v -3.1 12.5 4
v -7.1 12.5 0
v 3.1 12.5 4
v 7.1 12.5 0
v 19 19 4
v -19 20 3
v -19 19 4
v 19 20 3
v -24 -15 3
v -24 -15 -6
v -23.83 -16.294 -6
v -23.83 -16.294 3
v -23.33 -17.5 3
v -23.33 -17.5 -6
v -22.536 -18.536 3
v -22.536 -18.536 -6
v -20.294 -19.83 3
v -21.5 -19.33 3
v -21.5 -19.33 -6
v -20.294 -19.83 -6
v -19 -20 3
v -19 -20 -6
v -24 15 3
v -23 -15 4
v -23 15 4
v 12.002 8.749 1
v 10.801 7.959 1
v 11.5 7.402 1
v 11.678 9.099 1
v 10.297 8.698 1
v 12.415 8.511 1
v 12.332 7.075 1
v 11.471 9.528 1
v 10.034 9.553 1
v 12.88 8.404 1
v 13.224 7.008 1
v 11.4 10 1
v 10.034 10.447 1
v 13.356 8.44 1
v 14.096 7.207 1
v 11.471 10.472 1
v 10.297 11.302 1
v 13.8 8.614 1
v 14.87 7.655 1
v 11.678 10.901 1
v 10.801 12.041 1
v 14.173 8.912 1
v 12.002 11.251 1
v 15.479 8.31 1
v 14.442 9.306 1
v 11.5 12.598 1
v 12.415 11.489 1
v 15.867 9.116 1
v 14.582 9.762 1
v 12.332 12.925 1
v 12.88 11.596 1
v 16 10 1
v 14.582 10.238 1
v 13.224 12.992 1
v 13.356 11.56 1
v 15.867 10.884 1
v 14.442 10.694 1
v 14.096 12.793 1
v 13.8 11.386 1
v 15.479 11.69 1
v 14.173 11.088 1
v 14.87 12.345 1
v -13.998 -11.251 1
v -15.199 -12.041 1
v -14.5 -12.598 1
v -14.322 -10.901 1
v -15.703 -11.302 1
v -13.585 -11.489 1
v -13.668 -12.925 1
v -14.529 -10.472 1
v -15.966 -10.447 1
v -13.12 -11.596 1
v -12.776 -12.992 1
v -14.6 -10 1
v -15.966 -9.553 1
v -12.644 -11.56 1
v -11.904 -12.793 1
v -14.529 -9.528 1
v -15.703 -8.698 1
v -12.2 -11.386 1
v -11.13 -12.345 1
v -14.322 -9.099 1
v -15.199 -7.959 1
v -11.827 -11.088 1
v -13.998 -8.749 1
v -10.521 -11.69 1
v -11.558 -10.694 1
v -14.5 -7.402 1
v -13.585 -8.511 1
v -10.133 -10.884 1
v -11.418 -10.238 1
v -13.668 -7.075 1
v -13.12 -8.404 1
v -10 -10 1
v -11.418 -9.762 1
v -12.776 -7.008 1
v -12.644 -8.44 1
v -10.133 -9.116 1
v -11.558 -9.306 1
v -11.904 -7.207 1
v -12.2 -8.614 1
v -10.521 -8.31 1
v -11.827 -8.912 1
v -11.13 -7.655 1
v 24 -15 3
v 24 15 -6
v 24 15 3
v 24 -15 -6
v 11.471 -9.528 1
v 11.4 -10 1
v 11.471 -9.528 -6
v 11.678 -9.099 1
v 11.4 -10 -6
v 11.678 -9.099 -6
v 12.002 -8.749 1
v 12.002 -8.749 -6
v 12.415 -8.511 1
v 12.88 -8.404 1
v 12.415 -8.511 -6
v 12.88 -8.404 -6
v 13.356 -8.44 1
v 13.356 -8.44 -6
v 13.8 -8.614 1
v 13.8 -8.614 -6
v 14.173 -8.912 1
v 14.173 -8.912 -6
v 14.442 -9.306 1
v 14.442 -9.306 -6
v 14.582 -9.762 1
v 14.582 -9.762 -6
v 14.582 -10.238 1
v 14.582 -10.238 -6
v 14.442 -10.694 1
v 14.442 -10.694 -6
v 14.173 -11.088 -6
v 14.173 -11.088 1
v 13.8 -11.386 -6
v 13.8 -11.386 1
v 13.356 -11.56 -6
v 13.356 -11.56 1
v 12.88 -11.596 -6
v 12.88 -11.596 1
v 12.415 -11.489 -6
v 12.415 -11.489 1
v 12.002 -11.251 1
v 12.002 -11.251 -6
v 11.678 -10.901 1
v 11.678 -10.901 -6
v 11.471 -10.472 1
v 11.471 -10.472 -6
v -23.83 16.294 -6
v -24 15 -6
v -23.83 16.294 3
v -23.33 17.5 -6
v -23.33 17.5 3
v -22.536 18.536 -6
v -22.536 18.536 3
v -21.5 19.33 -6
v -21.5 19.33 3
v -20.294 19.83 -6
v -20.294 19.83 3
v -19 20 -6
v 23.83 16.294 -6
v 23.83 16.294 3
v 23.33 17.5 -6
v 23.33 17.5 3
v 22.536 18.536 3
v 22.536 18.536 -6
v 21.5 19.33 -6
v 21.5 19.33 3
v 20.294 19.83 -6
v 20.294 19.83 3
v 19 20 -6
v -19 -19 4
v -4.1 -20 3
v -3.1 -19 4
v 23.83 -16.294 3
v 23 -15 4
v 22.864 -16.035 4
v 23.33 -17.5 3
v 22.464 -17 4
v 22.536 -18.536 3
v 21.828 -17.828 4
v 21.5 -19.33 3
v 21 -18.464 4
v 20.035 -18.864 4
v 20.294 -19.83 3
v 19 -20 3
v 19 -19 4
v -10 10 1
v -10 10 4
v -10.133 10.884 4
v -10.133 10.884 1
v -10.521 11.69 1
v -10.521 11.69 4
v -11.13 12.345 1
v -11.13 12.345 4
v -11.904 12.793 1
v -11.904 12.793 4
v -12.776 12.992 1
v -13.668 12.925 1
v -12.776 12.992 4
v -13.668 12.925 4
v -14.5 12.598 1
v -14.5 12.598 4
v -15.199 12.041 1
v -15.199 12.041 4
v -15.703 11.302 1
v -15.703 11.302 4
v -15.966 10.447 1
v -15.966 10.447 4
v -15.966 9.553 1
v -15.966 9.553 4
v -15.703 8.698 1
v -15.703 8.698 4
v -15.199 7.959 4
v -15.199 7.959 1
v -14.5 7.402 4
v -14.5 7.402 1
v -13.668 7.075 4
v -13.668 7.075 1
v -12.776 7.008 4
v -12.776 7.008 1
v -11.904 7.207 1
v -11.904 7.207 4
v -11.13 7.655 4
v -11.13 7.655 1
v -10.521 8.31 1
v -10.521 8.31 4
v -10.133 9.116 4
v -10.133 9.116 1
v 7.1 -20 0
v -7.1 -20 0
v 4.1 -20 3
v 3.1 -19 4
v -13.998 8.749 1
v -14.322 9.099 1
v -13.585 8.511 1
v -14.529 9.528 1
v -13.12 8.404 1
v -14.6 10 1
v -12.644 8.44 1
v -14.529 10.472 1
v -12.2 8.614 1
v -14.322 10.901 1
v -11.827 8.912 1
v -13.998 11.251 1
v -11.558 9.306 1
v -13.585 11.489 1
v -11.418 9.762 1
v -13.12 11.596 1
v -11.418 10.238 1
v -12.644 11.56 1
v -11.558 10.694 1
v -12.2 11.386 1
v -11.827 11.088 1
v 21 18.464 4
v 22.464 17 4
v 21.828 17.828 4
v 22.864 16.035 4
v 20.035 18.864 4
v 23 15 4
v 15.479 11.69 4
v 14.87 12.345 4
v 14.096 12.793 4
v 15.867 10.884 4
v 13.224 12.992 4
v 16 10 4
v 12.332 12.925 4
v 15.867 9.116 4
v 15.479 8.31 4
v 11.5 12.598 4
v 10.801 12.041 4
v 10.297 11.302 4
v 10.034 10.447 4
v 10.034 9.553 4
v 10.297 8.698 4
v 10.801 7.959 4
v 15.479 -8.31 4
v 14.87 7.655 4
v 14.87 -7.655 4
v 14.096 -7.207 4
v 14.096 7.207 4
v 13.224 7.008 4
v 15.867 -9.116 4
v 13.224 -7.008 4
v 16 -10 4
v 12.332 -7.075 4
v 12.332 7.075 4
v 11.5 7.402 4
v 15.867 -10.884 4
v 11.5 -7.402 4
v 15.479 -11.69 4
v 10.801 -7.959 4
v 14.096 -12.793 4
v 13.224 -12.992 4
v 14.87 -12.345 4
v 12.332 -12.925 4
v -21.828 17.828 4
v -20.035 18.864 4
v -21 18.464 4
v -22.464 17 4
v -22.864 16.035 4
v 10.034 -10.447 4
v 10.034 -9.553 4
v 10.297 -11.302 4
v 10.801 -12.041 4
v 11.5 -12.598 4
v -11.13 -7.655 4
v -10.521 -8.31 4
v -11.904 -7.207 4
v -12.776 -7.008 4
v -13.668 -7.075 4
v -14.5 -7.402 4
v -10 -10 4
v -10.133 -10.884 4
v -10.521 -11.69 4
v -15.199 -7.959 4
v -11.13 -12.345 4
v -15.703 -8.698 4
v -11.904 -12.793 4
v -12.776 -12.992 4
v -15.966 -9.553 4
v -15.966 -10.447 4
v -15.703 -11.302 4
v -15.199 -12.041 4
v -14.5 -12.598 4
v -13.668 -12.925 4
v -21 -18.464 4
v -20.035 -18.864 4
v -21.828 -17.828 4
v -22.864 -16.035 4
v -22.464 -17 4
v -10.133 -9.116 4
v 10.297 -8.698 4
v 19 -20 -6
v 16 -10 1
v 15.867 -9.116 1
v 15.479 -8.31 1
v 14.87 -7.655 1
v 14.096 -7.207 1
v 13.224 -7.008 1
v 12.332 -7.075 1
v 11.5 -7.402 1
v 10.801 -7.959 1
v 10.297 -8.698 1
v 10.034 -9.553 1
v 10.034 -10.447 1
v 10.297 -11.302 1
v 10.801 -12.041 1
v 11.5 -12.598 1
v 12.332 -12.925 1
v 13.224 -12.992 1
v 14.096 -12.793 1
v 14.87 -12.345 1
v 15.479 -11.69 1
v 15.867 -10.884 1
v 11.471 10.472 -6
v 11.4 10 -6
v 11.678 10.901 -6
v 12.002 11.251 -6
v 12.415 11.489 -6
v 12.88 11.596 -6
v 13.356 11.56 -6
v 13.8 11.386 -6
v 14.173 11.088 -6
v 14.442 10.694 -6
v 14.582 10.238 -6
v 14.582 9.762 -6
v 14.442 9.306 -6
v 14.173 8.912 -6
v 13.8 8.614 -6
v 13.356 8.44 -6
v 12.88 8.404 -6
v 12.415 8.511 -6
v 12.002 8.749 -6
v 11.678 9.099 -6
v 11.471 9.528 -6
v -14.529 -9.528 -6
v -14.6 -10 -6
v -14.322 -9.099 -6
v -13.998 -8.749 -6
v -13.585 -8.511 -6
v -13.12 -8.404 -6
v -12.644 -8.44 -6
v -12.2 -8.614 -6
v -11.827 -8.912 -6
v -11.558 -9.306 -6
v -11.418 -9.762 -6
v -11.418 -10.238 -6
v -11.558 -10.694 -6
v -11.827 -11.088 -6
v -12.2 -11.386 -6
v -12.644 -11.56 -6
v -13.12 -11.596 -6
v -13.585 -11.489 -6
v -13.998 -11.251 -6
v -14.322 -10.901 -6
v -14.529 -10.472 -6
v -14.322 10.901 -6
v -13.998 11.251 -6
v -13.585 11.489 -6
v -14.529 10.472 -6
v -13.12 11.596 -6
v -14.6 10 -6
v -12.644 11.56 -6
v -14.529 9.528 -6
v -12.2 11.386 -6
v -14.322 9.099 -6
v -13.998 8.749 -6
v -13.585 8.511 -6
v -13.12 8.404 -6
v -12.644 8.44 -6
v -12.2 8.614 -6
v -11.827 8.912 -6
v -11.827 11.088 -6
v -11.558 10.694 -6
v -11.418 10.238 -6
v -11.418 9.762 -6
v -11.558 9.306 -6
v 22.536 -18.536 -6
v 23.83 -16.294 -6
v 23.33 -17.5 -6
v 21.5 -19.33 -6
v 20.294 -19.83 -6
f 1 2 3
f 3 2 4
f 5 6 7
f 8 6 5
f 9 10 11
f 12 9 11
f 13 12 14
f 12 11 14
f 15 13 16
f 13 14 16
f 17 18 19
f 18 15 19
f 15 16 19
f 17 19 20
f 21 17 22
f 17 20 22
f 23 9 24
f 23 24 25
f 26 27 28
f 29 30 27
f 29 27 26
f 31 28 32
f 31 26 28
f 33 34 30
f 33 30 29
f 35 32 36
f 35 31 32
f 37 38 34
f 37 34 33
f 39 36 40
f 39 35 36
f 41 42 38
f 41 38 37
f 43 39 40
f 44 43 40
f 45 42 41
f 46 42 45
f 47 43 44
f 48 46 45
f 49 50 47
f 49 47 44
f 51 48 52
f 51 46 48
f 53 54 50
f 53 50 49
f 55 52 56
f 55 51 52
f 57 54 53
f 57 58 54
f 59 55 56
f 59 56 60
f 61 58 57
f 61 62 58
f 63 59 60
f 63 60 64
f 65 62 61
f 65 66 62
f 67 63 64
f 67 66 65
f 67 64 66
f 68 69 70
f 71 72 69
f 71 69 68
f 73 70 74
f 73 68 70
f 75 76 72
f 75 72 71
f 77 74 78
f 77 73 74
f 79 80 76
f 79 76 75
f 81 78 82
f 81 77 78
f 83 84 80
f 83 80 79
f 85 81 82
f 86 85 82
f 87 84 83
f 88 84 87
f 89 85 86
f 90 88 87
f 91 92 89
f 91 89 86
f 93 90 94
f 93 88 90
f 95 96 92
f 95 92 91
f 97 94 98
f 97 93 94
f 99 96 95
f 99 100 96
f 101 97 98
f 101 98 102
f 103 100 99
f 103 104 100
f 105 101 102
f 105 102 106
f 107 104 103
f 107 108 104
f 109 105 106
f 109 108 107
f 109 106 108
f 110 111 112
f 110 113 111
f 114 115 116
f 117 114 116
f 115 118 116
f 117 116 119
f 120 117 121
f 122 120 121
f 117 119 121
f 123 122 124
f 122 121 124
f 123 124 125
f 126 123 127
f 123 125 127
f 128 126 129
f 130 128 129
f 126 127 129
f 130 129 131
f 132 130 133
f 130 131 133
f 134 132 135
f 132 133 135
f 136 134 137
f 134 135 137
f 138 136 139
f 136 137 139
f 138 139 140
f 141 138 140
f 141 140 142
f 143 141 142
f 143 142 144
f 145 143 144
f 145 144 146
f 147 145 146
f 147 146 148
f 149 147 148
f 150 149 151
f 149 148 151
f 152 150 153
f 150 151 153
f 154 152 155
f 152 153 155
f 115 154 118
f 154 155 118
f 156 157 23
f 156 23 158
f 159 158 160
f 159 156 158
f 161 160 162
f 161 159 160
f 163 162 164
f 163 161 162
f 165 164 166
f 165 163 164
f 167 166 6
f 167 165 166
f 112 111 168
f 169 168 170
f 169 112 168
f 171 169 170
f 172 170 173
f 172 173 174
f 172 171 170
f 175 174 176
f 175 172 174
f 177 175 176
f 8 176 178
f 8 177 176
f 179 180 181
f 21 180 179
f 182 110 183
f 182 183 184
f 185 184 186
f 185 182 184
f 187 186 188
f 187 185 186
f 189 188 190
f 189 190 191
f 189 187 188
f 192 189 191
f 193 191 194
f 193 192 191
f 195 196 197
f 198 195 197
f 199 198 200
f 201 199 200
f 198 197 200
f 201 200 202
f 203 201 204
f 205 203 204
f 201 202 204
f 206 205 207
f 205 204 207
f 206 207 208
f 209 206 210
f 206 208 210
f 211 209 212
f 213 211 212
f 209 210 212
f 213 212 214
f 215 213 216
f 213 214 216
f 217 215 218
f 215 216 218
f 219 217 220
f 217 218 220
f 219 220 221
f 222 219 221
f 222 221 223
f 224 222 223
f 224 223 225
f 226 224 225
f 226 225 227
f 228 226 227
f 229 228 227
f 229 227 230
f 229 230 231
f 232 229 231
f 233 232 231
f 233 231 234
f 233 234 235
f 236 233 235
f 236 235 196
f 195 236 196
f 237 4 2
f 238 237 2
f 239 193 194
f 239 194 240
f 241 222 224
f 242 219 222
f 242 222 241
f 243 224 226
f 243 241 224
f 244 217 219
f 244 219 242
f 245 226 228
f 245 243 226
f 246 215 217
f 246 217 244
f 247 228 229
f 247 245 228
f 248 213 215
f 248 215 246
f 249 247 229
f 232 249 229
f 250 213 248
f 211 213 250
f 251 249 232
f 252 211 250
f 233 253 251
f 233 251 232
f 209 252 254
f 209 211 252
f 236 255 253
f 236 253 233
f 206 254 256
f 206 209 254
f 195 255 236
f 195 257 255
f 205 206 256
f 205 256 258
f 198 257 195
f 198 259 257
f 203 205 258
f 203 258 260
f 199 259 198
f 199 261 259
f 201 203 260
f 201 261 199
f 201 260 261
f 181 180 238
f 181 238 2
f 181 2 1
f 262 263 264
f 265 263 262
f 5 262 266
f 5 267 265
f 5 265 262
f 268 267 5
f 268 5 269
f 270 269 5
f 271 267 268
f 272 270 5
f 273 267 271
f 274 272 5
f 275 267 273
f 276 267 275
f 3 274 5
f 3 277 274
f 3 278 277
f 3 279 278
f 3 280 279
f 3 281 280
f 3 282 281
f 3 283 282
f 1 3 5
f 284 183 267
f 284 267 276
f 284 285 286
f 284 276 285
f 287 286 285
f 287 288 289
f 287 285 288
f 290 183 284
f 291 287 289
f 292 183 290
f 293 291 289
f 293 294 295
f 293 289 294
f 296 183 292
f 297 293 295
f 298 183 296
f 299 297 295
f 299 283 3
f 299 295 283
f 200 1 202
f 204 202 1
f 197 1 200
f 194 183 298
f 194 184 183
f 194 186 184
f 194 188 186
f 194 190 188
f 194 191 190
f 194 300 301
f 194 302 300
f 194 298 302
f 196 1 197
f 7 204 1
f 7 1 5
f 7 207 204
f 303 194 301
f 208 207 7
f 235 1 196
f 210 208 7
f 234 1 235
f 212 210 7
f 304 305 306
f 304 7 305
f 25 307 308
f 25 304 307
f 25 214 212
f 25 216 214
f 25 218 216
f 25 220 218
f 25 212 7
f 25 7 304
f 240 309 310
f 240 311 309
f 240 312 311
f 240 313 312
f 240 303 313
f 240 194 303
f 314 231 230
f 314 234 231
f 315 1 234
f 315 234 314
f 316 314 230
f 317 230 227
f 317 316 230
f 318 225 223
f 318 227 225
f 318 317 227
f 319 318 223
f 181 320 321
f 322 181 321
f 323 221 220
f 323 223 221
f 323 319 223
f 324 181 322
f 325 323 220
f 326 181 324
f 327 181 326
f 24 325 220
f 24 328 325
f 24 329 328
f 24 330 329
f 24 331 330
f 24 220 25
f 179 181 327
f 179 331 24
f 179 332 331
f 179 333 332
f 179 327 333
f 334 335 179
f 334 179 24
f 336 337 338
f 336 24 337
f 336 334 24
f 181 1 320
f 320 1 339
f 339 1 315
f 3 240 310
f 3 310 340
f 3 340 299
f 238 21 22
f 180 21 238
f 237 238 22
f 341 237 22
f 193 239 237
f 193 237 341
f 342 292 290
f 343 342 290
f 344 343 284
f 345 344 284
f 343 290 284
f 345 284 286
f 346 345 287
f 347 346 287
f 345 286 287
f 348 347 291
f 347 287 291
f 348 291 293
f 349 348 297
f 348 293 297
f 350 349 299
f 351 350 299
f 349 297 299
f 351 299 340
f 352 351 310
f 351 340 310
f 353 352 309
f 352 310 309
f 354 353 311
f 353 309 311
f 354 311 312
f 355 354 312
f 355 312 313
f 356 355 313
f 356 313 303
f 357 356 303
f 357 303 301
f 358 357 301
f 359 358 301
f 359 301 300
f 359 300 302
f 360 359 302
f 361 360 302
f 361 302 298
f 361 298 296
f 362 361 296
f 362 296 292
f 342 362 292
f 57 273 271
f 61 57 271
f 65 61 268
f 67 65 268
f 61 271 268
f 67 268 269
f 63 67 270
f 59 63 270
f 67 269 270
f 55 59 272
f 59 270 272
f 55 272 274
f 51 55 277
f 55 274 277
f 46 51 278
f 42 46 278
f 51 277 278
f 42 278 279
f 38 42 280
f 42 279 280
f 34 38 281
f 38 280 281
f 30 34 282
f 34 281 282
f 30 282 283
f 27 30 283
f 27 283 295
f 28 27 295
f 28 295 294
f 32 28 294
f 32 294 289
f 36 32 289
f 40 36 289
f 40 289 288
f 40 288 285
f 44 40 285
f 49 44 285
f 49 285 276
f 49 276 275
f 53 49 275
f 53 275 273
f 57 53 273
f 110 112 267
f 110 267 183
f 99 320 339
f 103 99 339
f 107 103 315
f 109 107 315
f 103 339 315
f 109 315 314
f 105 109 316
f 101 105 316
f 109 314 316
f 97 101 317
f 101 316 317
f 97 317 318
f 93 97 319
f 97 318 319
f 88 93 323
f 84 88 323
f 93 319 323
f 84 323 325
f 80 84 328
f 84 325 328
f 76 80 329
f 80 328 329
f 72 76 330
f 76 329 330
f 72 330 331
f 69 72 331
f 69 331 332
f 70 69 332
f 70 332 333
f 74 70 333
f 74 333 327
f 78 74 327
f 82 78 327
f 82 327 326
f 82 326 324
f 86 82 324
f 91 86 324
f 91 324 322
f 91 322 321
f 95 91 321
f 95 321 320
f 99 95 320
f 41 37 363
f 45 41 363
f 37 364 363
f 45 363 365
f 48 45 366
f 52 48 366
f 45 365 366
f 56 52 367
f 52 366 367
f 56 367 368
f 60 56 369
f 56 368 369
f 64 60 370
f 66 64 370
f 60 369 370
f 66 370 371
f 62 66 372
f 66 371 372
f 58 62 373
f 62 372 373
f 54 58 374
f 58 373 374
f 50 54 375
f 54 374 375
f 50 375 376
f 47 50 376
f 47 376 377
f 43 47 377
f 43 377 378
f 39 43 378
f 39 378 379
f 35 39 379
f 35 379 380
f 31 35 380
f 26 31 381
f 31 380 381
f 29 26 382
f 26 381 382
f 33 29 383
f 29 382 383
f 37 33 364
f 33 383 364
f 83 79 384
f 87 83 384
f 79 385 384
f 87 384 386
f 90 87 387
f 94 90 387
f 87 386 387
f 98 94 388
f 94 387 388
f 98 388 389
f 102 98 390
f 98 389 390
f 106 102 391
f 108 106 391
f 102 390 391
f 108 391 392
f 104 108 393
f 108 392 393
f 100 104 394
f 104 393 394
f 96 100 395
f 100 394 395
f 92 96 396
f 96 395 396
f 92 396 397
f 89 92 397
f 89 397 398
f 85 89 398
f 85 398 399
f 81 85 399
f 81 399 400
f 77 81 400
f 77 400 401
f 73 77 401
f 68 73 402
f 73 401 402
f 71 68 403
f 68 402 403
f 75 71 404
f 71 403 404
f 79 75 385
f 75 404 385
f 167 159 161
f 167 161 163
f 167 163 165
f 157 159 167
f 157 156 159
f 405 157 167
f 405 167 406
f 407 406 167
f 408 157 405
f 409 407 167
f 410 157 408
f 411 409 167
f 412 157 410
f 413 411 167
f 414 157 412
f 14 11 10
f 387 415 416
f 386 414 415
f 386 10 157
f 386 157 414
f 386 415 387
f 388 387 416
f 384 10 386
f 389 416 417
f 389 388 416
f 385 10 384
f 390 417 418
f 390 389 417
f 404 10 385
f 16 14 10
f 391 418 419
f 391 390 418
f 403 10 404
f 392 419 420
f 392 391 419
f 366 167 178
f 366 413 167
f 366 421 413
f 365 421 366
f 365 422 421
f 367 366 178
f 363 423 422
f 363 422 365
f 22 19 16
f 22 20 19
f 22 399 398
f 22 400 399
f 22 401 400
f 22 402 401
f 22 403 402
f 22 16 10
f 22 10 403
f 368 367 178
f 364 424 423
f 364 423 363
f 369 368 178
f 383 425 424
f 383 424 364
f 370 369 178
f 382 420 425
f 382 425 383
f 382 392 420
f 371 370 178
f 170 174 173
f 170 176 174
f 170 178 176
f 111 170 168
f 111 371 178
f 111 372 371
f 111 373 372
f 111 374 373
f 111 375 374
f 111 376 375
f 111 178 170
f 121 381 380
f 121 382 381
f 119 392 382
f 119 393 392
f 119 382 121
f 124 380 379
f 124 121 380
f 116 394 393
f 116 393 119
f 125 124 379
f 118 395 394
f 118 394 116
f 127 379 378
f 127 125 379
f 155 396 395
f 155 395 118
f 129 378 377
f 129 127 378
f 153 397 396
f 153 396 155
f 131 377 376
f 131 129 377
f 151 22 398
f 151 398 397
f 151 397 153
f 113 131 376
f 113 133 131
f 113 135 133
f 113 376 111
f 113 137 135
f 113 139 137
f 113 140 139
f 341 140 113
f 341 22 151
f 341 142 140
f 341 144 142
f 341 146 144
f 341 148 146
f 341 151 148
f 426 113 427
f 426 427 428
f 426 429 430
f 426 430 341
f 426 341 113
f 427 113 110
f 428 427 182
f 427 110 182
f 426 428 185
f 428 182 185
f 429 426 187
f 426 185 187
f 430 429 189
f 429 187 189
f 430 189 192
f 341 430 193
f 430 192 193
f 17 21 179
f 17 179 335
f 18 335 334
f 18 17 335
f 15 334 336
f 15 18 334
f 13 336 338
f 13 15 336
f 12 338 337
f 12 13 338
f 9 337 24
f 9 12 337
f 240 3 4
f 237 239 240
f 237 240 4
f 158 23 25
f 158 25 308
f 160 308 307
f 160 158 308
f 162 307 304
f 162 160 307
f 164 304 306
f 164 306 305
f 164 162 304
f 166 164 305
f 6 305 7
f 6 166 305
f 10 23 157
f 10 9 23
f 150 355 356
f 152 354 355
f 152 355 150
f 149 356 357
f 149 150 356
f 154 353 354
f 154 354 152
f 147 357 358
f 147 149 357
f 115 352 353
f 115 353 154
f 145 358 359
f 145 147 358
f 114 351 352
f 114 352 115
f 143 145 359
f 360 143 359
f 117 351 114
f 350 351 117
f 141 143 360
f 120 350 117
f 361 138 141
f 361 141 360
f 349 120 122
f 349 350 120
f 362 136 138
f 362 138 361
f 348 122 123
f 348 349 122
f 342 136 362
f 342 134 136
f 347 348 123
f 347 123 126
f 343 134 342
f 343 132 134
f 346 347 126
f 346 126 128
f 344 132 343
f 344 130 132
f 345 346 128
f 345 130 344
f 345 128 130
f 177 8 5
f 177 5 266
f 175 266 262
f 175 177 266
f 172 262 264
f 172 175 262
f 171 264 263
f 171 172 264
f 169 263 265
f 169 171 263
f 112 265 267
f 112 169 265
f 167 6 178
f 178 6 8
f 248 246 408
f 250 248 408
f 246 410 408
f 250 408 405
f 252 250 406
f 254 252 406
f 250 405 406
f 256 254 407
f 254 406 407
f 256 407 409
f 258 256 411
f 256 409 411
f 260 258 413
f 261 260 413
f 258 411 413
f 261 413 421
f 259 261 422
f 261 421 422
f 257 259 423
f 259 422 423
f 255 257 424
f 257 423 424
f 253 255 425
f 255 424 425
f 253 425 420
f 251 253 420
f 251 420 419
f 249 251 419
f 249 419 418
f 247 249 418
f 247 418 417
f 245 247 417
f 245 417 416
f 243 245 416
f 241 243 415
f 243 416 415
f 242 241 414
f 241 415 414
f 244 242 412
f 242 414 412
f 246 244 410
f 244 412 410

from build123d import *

# Parameters (mm, degrees)
F1_DEPTH       = 20
F2_R           = 5
F5_D           = 3.2
F5_CBORE_D     = 6
F5_CBORE_DEPTH = 3
F6_W           = 18
F6_H           = 7.5
F7_DEPTH       = 10
F8_SIZE        = 1


# Not quite as in the source:
# - a feature of the source that left no trace in its solid (it failed there, or was rolled back) is left out


with BuildPart() as f1:
    # F0 (on Front) → F1 (new body, symmetric)
    with BuildSketch(Plane.XZ):
        Polygon((-24, 4), (-24, 0), (-24, -6), (24, -6), (24, 0), (24, 4), (3.1, 4), (7.1, 0), (-7.1, 0), (-3.1, 4), align=None)
    extrude(amount=F1_DEPTH, both=True)

    # F2
    f2_edges = [f1.edges().sort_by_distance(p)[0] for p in [
        (-24, 20, -1),
        (24, 20, -1),
        (24, -20, -1),
        (-24, -20, -1),
    ]]
    fillet(f2_edges, radius=F2_R)

    # F5 (through all)
    with Locations(Plane.XY.offset(4)):
        with Locations((13, -10), (-13, -10), (13, 10), (-13, 10)):
            CounterBoreHole(F5_D / 2, F5_CBORE_D / 2, F5_CBORE_DEPTH)

    # F6 (on face) → F7 (join)
    with BuildSketch(Plane(origin=(0, 0, -6), x_dir=(1, 0, 0), z_dir=(0, 0, -1))):
        with Locations((0, -16.25)):
            Rectangle(F6_W, F6_H)
    extrude(amount=-F7_DEPTH)

    # F8
    f8_edges = [f1.edges().sort_by_distance(p)[0] for p in [
        (0, 20, 4),
        (-22.535534, 18.535534, 4),
        (-24, 0, 4),
        (-22.535534, -18.535534, 4),
        (-11.05, -20, 4),
        (11.05, -20, 4),
        (22.535534, -18.535534, 4),
        (24, 0, 4),
        (22.535534, 18.535534, 4),
    ]]
    chamfer(f8_edges, length=F8_SIZE)


solid = f1.part
